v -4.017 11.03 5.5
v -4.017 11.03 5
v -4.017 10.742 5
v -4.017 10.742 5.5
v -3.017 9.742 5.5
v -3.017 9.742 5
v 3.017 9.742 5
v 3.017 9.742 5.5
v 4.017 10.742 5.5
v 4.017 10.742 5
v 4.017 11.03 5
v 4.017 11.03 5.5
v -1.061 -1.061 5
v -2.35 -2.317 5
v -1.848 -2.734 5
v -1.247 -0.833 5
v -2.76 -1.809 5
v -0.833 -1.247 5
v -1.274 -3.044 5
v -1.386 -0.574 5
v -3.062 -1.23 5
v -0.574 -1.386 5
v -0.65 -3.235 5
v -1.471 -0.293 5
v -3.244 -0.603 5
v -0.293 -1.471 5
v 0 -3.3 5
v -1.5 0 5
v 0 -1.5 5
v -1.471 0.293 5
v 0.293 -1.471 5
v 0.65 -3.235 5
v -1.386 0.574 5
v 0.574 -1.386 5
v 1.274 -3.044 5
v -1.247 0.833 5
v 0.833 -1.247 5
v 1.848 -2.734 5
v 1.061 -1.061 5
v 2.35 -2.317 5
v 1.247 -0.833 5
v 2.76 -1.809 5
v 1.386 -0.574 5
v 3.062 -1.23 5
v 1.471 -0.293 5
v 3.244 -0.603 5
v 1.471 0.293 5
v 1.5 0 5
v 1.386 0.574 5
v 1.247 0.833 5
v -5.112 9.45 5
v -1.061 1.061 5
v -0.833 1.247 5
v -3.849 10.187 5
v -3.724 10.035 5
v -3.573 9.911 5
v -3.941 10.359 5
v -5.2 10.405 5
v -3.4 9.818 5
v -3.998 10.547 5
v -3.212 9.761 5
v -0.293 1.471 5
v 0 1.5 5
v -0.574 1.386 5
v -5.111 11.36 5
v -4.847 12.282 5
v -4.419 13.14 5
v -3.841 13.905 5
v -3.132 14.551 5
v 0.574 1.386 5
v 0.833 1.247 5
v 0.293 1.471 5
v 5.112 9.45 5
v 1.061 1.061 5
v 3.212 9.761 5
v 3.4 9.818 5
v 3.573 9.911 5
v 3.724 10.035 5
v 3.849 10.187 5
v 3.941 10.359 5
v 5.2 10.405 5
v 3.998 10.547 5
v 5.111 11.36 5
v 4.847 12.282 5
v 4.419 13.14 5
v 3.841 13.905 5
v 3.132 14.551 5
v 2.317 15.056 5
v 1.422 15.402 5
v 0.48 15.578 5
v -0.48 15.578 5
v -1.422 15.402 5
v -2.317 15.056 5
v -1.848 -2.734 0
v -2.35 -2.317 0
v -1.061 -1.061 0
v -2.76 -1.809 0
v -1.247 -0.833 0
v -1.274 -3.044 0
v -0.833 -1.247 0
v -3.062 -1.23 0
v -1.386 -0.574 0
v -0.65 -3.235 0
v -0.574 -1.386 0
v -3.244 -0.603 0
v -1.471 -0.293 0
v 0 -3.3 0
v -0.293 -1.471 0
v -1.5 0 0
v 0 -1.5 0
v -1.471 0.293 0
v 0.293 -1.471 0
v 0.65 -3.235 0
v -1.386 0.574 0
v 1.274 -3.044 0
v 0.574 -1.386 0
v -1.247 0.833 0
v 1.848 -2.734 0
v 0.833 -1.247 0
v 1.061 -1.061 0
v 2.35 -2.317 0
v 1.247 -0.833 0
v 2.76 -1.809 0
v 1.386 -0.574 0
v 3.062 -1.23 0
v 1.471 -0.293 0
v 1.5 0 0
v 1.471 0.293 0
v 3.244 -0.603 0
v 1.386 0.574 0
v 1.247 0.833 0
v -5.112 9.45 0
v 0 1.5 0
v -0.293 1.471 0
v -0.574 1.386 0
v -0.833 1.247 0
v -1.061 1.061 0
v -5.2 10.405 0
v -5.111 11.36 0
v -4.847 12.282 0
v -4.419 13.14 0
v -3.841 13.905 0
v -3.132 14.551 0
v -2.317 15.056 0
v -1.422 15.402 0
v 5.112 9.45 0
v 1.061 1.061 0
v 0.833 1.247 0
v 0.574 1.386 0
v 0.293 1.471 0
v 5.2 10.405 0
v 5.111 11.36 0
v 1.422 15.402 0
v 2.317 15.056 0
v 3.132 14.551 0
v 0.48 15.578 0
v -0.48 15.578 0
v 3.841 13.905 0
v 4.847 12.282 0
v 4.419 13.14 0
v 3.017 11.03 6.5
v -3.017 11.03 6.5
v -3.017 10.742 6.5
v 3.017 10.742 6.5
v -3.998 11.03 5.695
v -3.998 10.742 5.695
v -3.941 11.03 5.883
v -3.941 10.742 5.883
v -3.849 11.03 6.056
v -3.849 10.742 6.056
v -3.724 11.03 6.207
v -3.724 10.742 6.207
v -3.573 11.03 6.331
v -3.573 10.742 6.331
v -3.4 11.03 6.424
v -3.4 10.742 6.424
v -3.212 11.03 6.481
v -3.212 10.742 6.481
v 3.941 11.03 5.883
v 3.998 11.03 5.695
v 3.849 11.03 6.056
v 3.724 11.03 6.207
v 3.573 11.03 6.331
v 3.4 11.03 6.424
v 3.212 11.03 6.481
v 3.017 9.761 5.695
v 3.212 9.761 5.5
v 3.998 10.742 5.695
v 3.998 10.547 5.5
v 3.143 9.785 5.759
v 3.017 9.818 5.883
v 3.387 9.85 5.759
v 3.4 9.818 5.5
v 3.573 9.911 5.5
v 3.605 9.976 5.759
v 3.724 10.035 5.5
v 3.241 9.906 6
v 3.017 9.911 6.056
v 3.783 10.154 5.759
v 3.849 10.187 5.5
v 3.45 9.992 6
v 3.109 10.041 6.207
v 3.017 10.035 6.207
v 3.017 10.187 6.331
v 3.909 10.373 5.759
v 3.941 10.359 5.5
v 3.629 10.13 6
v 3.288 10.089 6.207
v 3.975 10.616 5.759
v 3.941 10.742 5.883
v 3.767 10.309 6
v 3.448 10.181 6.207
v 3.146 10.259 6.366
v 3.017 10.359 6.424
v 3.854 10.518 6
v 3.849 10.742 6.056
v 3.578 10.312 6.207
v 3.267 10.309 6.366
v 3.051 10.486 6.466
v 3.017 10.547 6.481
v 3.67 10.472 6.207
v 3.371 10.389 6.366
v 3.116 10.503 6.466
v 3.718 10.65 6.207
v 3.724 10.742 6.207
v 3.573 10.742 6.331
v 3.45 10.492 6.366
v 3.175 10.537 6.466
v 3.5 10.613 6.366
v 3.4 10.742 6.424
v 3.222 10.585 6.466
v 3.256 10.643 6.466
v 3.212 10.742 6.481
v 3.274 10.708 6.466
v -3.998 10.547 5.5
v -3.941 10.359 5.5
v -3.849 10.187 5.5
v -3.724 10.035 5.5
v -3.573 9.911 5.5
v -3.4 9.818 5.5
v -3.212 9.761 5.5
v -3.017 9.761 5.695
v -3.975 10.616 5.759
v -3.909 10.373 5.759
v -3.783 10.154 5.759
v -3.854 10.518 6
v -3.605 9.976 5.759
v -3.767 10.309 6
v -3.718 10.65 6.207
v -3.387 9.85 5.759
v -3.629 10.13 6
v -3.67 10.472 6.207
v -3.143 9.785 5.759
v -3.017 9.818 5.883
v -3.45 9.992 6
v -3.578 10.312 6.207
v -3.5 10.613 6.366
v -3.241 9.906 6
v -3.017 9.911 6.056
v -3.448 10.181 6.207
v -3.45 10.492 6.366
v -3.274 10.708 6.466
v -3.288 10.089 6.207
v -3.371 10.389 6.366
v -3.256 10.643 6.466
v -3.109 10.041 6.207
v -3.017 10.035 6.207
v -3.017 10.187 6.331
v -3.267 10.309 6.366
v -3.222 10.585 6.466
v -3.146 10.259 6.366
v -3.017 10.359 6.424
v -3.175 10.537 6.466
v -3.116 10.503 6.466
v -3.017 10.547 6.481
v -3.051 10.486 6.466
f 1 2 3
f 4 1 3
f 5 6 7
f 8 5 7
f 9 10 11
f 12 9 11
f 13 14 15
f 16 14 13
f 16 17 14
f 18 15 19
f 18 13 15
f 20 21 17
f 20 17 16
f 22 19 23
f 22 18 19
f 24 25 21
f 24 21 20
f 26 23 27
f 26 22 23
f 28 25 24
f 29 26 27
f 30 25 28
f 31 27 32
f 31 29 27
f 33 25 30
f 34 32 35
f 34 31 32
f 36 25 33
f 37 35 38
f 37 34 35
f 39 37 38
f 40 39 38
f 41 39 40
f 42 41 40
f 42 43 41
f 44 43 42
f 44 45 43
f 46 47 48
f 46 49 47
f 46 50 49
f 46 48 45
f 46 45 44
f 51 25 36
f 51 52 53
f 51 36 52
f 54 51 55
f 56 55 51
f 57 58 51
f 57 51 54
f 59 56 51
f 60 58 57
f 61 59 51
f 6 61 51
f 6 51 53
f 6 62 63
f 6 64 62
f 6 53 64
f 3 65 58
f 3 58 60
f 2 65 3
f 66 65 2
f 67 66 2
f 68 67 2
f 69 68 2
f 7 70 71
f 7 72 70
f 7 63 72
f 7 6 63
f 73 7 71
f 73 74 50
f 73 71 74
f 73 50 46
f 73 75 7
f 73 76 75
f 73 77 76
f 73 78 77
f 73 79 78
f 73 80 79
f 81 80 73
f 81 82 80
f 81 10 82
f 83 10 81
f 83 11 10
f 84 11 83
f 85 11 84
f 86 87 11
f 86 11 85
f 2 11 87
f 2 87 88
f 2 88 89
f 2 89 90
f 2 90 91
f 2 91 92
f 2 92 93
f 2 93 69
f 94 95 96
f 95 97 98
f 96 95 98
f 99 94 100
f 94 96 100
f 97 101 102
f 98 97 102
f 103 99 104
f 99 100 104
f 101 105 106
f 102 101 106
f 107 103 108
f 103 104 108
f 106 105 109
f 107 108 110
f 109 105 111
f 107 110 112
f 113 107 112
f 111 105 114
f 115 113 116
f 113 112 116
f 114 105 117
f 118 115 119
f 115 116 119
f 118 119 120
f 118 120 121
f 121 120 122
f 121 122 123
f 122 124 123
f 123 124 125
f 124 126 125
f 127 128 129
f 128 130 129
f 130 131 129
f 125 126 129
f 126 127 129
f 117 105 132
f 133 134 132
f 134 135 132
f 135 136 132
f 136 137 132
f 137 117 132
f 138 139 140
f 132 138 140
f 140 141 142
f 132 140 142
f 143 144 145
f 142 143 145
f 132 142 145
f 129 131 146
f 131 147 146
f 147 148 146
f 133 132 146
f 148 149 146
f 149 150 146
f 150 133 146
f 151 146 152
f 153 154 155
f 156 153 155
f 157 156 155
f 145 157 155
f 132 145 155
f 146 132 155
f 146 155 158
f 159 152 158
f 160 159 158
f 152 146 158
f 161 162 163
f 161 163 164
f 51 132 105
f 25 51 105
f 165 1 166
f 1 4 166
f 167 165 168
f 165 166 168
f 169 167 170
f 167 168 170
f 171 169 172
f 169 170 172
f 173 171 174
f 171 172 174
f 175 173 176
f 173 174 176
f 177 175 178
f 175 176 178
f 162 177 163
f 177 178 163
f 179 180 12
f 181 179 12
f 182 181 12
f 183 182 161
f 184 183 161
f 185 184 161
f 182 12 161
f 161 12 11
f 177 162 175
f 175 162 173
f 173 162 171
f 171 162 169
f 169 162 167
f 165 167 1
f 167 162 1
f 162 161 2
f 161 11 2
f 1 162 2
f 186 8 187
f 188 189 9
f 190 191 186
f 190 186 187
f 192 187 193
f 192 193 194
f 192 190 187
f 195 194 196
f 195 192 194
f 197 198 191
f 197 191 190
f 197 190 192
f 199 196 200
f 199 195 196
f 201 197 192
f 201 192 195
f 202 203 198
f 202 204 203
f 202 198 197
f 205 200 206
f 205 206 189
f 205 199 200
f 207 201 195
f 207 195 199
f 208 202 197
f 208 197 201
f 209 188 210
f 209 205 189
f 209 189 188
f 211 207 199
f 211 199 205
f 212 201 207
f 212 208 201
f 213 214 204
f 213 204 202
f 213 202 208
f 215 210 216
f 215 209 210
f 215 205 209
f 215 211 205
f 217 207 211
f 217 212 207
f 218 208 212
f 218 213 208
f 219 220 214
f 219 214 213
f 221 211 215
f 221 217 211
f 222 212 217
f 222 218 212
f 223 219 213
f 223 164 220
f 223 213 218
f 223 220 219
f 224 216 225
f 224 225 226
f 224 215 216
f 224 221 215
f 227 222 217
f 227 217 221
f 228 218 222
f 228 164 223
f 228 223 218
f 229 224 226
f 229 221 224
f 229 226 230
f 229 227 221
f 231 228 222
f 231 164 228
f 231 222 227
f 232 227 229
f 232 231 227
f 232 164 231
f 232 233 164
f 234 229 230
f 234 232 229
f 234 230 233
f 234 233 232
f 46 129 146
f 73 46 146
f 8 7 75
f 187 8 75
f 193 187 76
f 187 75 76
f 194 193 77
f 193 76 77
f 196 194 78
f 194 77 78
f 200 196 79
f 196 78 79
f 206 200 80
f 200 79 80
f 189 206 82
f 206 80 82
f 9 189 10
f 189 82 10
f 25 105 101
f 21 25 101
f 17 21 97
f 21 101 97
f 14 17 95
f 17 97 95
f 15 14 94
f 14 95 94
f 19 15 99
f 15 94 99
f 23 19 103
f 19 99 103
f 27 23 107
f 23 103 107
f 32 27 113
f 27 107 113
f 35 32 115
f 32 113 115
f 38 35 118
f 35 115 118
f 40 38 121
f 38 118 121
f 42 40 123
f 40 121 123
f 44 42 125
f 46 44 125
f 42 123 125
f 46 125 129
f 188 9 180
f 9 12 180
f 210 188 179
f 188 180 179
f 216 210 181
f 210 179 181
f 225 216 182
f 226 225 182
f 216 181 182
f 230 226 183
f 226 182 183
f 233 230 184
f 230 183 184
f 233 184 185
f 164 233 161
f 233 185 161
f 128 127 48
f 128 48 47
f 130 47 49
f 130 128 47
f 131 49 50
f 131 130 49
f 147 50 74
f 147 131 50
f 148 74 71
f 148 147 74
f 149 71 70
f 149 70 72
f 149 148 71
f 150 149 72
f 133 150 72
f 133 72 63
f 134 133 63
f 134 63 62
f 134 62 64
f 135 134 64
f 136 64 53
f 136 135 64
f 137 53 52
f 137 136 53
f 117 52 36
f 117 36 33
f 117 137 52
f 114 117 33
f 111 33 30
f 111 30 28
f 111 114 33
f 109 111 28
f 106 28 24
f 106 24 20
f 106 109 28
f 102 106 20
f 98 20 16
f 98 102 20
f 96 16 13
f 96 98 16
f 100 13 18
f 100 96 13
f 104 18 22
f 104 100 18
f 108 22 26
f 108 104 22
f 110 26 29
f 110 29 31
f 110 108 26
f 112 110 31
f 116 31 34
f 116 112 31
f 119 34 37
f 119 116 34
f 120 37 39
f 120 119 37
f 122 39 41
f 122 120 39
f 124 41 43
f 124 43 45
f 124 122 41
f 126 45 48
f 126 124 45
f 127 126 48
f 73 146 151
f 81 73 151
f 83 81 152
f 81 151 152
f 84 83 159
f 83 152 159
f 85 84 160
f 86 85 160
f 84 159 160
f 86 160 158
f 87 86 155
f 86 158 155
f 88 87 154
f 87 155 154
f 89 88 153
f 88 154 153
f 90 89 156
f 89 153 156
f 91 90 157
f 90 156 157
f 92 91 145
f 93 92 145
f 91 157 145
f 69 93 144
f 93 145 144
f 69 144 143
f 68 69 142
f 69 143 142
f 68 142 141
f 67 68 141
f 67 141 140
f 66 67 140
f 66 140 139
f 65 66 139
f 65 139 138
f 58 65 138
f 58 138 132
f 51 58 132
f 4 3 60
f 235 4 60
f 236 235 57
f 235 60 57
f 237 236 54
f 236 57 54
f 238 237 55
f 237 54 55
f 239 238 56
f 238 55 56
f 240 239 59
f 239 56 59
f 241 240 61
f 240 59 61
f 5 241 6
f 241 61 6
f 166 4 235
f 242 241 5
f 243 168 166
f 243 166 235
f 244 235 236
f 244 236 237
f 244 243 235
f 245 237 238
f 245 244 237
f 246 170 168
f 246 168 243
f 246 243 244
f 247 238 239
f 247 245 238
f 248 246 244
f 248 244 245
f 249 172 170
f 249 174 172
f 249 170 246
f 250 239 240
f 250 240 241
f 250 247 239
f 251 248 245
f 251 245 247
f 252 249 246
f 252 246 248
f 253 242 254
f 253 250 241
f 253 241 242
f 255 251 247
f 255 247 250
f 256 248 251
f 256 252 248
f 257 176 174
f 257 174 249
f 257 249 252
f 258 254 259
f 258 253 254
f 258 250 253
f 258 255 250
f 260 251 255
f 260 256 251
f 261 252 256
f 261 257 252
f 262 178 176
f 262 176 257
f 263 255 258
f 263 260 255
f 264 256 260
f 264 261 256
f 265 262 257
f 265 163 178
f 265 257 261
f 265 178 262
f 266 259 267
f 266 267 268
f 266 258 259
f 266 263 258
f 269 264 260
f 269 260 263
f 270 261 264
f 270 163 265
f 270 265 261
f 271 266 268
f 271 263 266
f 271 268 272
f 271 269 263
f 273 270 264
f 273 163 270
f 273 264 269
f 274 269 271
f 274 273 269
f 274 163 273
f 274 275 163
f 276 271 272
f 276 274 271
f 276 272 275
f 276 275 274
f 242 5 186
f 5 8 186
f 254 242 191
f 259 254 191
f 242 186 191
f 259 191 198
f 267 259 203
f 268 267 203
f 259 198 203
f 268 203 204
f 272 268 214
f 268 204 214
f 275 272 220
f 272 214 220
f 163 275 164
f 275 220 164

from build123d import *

# Parameters (mm, degrees)
SKETCH1_R           = 1.5
BOSS_EXTRUDE1_DEPTH = 5
BOSS_EXTRUDE2_DEPTH = 1.5
FILLET1_R           = 1


with BuildPart() as part:
    # Sketch1 → Boss-Extrude1 (new body)
    with BuildSketch(Plane.XY):
        with BuildLine():
            Line((-5.112484719, 9.45), (-3.244461456, -0.602884615))
            ThreePointArc((-3.244461456, -0.602884615), (0, -3.3), (3.244461456, -0.602884615))
            Line((3.244461456, -0.602884615), (5.112484719, 9.45))
            ThreePointArc((5.112484719, 9.45), (0, 15.6), (-5.112484719, 9.45))
        make_face()
        Circle(SKETCH1_R, mode=Mode.SUBTRACT)
    extrude(amount=BOSS_EXTRUDE1_DEPTH)

    # Sketch2 → Boss-Extrude2 (add)
    with BuildSketch(Plane.XY.offset(5)):
        with BuildLine():
            Line((-3.017059628, 9.742178321), (3.017059628, 9.742178321))
            ThreePointArc((3.017059628, 9.742178321), (3.724166409, 10.03507154), (4.017059628, 10.742178321))
            Line((4.017059628, 10.742178321), (4.017059628, 11.029697433))
            Line((4.017059628, 11.029697433), (-4.017059628, 11.029697433))
            Line((-4.017059628, 11.029697433), (-4.017059628, 10.742178321))
            ThreePointArc((-4.017059628, 10.742178321), (-3.724166409, 10.03507154), (-3.017059628, 9.742178321))
        make_face()
    extrude(amount=BOSS_EXTRUDE2_DEPTH)

    # Fillet1
    fillet1_edges = [part.edges().sort_by_distance(p)[0] for p in [
        (4.017059628, 10.885937877, 6.5),
        (-4.017059628, 10.885937877, 6.5),
        (-3.724166409, 10.03507154, 6.5),
        (0, 9.742178321, 6.5),
        (3.724166409, 10.03507154, 6.5),
    ]]
    fillet(fillet1_edges, radius=FILLET1_R)


solid = part.part
